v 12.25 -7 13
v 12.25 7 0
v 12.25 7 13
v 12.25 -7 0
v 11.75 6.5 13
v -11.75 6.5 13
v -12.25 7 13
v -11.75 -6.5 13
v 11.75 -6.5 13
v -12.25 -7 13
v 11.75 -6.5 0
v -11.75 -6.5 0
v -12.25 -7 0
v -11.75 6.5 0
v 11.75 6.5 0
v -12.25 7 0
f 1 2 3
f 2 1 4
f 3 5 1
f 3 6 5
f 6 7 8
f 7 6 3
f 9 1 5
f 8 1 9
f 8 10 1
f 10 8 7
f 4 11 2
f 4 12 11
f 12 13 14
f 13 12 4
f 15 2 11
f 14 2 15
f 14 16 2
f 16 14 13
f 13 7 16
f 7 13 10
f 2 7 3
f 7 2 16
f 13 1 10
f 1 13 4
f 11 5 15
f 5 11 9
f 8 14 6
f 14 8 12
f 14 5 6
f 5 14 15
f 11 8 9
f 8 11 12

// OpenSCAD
servo_x = 23;
servo_y = 12.5;
servo_z = 13;

servo_x_offset = servo_x/2 - 6;

servo_x_clearance = 0.5;
servo_y_clearance = 0.5;

wall_thickness = 1;



translate([0,0,servo_z/2])
difference(){
    cube([
        servo_x+servo_x_clearance+wall_thickness, 
        servo_y+servo_y_clearance+wall_thickness,
        servo_z], center=true);
    cube([
        servo_x+servo_x_clearance, 
        servo_y+servo_y_clearance,
        servo_z+1], center=true);
}
